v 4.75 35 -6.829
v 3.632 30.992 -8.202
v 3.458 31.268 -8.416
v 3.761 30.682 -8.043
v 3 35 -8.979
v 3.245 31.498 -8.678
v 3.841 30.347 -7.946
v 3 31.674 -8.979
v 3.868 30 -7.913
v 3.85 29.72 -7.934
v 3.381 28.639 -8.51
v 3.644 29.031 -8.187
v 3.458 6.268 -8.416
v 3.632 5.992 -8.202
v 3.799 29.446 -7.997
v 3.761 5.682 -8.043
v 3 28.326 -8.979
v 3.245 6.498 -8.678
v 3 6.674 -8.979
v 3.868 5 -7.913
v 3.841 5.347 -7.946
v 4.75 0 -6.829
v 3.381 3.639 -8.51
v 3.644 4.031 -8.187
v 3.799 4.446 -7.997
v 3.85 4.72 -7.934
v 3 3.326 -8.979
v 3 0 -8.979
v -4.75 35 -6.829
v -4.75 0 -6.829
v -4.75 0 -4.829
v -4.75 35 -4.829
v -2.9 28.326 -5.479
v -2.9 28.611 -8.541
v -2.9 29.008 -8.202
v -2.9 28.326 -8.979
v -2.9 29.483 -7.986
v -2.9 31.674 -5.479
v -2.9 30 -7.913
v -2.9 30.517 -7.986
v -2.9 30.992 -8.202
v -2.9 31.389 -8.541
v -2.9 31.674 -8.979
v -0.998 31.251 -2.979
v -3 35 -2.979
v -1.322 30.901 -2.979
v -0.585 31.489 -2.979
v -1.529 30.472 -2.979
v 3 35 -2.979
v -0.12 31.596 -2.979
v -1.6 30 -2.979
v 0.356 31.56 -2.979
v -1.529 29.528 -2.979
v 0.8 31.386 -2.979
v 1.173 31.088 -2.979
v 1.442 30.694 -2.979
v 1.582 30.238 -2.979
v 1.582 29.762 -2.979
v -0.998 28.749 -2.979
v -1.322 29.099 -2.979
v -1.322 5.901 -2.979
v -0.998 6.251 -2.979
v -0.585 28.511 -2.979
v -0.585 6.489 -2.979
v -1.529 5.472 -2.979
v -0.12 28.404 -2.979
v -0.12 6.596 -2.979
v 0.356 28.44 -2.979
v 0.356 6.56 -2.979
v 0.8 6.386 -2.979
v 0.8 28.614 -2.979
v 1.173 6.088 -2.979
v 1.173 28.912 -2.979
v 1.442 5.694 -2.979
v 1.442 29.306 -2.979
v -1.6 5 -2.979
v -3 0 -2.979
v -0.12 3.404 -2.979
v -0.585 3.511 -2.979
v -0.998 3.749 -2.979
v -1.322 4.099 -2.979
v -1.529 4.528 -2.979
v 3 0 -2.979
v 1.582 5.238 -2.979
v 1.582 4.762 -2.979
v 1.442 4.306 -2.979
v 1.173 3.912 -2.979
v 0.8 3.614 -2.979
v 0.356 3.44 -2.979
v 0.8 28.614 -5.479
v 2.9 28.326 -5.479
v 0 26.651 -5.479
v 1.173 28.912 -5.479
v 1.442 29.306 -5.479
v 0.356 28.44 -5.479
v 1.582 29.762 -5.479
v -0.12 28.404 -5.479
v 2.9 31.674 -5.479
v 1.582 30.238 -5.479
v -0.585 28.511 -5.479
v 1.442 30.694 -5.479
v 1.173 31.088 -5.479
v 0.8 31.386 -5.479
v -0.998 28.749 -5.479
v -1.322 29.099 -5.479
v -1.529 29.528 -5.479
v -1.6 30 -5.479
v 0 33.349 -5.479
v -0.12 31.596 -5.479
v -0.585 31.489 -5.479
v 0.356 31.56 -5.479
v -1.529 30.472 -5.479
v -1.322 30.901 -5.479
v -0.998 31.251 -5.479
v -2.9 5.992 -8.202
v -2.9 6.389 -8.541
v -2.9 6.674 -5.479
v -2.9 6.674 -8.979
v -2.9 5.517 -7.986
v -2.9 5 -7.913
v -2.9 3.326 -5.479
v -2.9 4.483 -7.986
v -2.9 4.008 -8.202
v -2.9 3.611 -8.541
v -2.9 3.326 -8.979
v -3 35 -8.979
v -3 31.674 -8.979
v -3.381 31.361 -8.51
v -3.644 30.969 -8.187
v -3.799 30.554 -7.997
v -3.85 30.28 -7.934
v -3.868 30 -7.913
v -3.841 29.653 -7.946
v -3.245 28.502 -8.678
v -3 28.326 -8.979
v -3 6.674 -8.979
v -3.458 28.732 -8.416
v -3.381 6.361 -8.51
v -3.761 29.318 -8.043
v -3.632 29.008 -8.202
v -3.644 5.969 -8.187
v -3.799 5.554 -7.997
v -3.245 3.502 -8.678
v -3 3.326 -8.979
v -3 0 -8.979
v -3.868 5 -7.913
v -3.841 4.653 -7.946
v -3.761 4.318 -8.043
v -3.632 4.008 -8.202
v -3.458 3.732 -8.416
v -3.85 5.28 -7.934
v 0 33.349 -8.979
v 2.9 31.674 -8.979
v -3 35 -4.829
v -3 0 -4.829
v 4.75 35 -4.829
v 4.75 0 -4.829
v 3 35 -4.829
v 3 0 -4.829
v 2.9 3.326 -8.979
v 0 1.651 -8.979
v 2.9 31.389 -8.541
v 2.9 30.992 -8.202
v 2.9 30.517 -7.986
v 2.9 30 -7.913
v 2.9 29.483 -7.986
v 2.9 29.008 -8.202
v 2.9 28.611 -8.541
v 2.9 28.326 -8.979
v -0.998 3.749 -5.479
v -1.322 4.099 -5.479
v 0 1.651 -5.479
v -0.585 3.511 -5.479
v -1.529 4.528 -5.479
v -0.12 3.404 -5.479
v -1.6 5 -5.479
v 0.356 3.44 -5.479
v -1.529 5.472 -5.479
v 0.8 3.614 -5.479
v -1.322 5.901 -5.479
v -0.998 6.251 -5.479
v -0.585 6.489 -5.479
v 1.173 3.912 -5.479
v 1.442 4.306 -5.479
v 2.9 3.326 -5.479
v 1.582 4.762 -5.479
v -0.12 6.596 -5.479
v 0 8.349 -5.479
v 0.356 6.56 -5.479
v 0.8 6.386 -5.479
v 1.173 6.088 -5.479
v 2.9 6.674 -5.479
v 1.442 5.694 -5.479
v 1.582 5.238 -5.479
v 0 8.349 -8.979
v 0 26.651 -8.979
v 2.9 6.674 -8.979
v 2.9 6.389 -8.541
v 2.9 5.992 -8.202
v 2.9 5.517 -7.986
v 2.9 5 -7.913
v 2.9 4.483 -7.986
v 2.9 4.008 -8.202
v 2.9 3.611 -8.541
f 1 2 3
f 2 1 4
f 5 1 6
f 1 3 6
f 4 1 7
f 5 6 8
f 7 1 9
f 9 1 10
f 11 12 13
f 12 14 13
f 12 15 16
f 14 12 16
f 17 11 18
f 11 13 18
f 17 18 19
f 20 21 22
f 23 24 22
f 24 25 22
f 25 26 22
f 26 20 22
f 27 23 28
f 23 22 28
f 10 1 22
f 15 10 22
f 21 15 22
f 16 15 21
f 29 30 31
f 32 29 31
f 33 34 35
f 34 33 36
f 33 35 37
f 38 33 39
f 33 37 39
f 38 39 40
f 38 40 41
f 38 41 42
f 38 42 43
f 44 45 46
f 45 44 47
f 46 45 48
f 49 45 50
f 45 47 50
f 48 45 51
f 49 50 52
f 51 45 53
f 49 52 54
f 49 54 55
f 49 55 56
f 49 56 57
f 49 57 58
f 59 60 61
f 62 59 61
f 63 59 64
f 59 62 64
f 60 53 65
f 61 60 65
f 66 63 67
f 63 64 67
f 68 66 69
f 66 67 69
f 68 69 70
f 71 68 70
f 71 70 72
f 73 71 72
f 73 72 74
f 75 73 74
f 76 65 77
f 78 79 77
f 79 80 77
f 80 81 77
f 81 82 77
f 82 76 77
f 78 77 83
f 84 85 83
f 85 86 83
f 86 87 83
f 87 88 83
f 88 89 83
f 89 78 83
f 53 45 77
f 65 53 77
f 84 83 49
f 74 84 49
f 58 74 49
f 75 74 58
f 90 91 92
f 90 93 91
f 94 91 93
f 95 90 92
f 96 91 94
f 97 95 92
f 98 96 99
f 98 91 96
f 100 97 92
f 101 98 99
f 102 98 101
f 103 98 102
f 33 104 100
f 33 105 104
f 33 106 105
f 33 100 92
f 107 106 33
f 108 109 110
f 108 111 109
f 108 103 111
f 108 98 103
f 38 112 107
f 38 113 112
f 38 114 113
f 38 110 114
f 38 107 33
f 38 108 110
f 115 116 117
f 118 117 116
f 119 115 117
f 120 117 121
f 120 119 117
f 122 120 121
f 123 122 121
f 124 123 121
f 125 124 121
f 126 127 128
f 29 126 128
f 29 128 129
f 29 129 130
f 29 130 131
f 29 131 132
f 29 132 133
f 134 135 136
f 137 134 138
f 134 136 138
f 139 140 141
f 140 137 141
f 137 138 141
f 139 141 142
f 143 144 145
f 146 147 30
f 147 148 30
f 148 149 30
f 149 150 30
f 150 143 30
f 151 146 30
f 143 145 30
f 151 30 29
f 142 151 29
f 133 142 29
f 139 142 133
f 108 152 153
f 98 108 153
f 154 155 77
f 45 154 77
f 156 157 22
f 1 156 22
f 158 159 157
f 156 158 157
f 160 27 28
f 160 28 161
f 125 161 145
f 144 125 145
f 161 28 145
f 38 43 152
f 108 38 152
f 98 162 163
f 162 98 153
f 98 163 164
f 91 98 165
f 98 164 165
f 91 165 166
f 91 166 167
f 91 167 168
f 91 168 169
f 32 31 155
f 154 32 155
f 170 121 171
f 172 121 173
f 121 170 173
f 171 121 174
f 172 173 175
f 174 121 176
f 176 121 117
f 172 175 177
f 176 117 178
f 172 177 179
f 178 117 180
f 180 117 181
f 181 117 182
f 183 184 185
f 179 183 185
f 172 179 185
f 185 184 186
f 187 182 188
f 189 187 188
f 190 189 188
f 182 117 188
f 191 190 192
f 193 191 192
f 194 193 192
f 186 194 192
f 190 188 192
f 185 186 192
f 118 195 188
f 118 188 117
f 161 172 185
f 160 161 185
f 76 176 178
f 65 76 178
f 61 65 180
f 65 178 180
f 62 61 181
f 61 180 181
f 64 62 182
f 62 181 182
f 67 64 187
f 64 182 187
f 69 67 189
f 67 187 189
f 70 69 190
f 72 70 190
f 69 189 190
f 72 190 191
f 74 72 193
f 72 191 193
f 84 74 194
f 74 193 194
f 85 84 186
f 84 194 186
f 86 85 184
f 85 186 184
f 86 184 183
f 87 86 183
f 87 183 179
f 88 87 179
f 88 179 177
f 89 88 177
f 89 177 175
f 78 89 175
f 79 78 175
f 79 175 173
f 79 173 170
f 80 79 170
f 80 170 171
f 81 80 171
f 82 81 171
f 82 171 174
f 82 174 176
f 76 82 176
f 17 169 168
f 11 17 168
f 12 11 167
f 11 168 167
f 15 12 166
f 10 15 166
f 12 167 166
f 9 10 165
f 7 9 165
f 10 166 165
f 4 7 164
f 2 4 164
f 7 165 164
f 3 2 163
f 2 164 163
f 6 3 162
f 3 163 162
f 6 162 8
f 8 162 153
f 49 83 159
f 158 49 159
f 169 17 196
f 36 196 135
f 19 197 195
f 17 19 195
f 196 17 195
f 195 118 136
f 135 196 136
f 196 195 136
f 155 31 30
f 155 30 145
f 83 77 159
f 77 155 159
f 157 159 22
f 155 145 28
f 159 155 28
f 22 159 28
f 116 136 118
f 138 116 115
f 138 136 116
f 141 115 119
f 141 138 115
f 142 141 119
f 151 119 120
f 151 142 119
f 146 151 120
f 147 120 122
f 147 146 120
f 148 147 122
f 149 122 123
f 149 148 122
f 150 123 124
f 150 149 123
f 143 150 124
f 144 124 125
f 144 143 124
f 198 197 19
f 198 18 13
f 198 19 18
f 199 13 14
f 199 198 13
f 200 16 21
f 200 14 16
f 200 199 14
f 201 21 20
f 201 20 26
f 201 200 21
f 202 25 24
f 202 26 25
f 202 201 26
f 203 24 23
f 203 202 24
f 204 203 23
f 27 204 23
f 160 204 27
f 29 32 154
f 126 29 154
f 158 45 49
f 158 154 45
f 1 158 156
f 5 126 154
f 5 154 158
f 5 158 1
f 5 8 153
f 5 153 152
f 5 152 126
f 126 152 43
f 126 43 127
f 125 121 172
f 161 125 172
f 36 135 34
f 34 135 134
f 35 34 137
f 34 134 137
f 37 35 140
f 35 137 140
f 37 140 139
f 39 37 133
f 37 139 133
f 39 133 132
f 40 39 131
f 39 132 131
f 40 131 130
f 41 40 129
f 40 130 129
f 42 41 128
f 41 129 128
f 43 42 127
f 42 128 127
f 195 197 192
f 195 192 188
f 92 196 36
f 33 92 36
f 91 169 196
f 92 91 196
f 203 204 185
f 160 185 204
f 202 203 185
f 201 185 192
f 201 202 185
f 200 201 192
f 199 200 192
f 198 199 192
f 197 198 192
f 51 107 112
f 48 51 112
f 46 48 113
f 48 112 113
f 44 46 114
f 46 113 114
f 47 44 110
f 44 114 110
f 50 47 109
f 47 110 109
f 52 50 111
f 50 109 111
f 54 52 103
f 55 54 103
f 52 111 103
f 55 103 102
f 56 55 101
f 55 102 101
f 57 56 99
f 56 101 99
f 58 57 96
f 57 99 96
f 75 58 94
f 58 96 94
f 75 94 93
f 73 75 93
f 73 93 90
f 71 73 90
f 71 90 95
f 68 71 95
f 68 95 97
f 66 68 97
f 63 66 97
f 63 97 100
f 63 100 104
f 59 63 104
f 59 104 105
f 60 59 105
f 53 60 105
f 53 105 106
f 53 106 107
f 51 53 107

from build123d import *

# Parameters (mm, degrees)
EXTRUDE1_DEPTH             = 35
EXTRUDE2_REACH             = 37.827
SKETCH2_R                  = 1.6
SKETCH_R                   = 1.6
EXTRUDE3_DEPTH             = 3.5
EXTRUDE4_REACH             = 38.934
EXTRUDE4_DIRECTION_2_REACH = 38.934


with BuildPart() as part:
    # Sketch1 → Extrude1 (new body)
    with BuildSketch(Plane(origin=(0, 0, 0), x_dir=(1, 0, 0), z_dir=(0, 1, 0))):
        Polygon((-3, 2.978553588), (3, 2.978553588), (3, 4.828553588), (4.75, 4.828553588), (4.75, 6.828553588), (3, 8.978553588), (-3, 8.978553588), (-4.75, 6.828553588), (-4.75, 4.828553588), (-3, 4.828553588), align=None)
    extrude(amount=EXTRUDE1_DEPTH)

    # Sketch2 → Extrude2 (cut, up to next)
    with BuildSketch(Plane(origin=(0, 0, -8.978553588), x_dir=(-1, 0, 0), z_dir=(0, 0, -1)), mode=Mode.PRIVATE) as extrude2_sk1:
        with Locations((0, 30)):
            Circle(SKETCH2_R)
    extrude2_tool1 = extrude(extrude2_sk1.sketch, amount=-EXTRUDE2_REACH, mode=Mode.PRIVATE) & part.part
    # Sketch2 → Extrude2 (cut, up to next)
    with BuildSketch(Plane(origin=(0, 0, -8.978553588), x_dir=(-1, 0, 0), z_dir=(0, 0, -1)), mode=Mode.PRIVATE) as extrude2_sk2:
        with Locations((0, 5)):
            Circle(SKETCH2_R)
    extrude2_tool2 = extrude(extrude2_sk2.sketch, amount=-EXTRUDE2_REACH, mode=Mode.PRIVATE) & part.part
    add(extrude2_tool1.solids().sort_by_distance((0, 30, -8.978554))[0], mode=Mode.SUBTRACT)
    add(extrude2_tool2.solids().sort_by_distance((0, 5, -8.978554))[0], mode=Mode.SUBTRACT)

    # Sketch → Extrude3 (cut)
    # profile 1 of 2: a face of its own
    with BuildSketch(Plane(origin=(0, 0, -8.978553588), x_dir=(-1, 0, 0), z_dir=(0, 0, -1))):
        Polygon((0, 33.348631561), (-2.9, 31.674315781), (-2.9, 28.325684219), (0, 26.651368439), (2.9, 28.325684219), (2.9, 31.674315781), align=None)
        with Locations((0, 30)):
            Circle(SKETCH_R, mode=Mode.SUBTRACT)
    # profile 2 of 2: a face of its own
    with BuildSketch(Plane(origin=(0, 0, -8.978553588), x_dir=(-1, 0, 0), z_dir=(0, 0, -1))):
        Polygon((2.9, 3.325684219), (0, 1.651368439), (-2.9, 3.325684219), (-2.9, 6.674315781), (0, 8.348631561), (2.9, 6.674315781), align=None)
        with Locations((0, 5)):
            Circle(SKETCH_R, mode=Mode.SUBTRACT)
    extrude(amount=-EXTRUDE3_DEPTH, mode=Mode.SUBTRACT)

    # Sketch3 → Extrude4 (cut, up to next)
    with BuildSketch(Plane(origin=(-2.9, 0, 0), x_dir=(0, 0, -1), z_dir=(1, 0, 0)), mode=Mode.PRIVATE) as extrude4_sk1:
        with BuildLine():
            Line((8.978553588, 31.674315781), (8.978553588, 28.325684219))
            ThreePointArc((8.978553588, 28.325684219), (7.912621815, 30), (8.978553588, 31.674315781))
        make_face()
    extrude4_tool1 = extrude(extrude4_sk1.sketch, amount=-EXTRUDE4_REACH, mode=Mode.PRIVATE) & part.part
    extrude4 = extrude4_tool1.solids().sort_by_distance((-2.9, 30, -8.539494))[0]
    add(extrude4, mode=Mode.SUBTRACT)

    # Sketch3 → Extrude4 direction 2 (cut, up to next)
    with BuildSketch(Plane(origin=(-2.9, 0, 0), x_dir=(0, 0, -1), z_dir=(1, 0, 0)), mode=Mode.PRIVATE) as extrude4_direction_2_sk1:
        with BuildLine():
            Line((8.978553588, 31.674315781), (8.978553588, 28.325684219))
            ThreePointArc((8.978553588, 28.325684219), (7.912621815, 30), (8.978553588, 31.674315781))
        make_face()
    extrude4_direction_2_tool1 = extrude(extrude4_direction_2_sk1.sketch, amount=EXTRUDE4_DIRECTION_2_REACH, mode=Mode.PRIVATE) & part.part
    extrude4_direction_2 = extrude4_direction_2_tool1.solids().sort_by_distance((-2.9, 30, -8.539494))[0]
    add(extrude4_direction_2, mode=Mode.SUBTRACT)

    # Mirror1: Extrude4, Extrude4 direction 2 across plane
    add(extrude4.mirror(Plane.ZX.offset(17.5)), mode=Mode.SUBTRACT)
    add(extrude4_direction_2.mirror(Plane.ZX.offset(17.5)), mode=Mode.SUBTRACT)


solid = part.part
